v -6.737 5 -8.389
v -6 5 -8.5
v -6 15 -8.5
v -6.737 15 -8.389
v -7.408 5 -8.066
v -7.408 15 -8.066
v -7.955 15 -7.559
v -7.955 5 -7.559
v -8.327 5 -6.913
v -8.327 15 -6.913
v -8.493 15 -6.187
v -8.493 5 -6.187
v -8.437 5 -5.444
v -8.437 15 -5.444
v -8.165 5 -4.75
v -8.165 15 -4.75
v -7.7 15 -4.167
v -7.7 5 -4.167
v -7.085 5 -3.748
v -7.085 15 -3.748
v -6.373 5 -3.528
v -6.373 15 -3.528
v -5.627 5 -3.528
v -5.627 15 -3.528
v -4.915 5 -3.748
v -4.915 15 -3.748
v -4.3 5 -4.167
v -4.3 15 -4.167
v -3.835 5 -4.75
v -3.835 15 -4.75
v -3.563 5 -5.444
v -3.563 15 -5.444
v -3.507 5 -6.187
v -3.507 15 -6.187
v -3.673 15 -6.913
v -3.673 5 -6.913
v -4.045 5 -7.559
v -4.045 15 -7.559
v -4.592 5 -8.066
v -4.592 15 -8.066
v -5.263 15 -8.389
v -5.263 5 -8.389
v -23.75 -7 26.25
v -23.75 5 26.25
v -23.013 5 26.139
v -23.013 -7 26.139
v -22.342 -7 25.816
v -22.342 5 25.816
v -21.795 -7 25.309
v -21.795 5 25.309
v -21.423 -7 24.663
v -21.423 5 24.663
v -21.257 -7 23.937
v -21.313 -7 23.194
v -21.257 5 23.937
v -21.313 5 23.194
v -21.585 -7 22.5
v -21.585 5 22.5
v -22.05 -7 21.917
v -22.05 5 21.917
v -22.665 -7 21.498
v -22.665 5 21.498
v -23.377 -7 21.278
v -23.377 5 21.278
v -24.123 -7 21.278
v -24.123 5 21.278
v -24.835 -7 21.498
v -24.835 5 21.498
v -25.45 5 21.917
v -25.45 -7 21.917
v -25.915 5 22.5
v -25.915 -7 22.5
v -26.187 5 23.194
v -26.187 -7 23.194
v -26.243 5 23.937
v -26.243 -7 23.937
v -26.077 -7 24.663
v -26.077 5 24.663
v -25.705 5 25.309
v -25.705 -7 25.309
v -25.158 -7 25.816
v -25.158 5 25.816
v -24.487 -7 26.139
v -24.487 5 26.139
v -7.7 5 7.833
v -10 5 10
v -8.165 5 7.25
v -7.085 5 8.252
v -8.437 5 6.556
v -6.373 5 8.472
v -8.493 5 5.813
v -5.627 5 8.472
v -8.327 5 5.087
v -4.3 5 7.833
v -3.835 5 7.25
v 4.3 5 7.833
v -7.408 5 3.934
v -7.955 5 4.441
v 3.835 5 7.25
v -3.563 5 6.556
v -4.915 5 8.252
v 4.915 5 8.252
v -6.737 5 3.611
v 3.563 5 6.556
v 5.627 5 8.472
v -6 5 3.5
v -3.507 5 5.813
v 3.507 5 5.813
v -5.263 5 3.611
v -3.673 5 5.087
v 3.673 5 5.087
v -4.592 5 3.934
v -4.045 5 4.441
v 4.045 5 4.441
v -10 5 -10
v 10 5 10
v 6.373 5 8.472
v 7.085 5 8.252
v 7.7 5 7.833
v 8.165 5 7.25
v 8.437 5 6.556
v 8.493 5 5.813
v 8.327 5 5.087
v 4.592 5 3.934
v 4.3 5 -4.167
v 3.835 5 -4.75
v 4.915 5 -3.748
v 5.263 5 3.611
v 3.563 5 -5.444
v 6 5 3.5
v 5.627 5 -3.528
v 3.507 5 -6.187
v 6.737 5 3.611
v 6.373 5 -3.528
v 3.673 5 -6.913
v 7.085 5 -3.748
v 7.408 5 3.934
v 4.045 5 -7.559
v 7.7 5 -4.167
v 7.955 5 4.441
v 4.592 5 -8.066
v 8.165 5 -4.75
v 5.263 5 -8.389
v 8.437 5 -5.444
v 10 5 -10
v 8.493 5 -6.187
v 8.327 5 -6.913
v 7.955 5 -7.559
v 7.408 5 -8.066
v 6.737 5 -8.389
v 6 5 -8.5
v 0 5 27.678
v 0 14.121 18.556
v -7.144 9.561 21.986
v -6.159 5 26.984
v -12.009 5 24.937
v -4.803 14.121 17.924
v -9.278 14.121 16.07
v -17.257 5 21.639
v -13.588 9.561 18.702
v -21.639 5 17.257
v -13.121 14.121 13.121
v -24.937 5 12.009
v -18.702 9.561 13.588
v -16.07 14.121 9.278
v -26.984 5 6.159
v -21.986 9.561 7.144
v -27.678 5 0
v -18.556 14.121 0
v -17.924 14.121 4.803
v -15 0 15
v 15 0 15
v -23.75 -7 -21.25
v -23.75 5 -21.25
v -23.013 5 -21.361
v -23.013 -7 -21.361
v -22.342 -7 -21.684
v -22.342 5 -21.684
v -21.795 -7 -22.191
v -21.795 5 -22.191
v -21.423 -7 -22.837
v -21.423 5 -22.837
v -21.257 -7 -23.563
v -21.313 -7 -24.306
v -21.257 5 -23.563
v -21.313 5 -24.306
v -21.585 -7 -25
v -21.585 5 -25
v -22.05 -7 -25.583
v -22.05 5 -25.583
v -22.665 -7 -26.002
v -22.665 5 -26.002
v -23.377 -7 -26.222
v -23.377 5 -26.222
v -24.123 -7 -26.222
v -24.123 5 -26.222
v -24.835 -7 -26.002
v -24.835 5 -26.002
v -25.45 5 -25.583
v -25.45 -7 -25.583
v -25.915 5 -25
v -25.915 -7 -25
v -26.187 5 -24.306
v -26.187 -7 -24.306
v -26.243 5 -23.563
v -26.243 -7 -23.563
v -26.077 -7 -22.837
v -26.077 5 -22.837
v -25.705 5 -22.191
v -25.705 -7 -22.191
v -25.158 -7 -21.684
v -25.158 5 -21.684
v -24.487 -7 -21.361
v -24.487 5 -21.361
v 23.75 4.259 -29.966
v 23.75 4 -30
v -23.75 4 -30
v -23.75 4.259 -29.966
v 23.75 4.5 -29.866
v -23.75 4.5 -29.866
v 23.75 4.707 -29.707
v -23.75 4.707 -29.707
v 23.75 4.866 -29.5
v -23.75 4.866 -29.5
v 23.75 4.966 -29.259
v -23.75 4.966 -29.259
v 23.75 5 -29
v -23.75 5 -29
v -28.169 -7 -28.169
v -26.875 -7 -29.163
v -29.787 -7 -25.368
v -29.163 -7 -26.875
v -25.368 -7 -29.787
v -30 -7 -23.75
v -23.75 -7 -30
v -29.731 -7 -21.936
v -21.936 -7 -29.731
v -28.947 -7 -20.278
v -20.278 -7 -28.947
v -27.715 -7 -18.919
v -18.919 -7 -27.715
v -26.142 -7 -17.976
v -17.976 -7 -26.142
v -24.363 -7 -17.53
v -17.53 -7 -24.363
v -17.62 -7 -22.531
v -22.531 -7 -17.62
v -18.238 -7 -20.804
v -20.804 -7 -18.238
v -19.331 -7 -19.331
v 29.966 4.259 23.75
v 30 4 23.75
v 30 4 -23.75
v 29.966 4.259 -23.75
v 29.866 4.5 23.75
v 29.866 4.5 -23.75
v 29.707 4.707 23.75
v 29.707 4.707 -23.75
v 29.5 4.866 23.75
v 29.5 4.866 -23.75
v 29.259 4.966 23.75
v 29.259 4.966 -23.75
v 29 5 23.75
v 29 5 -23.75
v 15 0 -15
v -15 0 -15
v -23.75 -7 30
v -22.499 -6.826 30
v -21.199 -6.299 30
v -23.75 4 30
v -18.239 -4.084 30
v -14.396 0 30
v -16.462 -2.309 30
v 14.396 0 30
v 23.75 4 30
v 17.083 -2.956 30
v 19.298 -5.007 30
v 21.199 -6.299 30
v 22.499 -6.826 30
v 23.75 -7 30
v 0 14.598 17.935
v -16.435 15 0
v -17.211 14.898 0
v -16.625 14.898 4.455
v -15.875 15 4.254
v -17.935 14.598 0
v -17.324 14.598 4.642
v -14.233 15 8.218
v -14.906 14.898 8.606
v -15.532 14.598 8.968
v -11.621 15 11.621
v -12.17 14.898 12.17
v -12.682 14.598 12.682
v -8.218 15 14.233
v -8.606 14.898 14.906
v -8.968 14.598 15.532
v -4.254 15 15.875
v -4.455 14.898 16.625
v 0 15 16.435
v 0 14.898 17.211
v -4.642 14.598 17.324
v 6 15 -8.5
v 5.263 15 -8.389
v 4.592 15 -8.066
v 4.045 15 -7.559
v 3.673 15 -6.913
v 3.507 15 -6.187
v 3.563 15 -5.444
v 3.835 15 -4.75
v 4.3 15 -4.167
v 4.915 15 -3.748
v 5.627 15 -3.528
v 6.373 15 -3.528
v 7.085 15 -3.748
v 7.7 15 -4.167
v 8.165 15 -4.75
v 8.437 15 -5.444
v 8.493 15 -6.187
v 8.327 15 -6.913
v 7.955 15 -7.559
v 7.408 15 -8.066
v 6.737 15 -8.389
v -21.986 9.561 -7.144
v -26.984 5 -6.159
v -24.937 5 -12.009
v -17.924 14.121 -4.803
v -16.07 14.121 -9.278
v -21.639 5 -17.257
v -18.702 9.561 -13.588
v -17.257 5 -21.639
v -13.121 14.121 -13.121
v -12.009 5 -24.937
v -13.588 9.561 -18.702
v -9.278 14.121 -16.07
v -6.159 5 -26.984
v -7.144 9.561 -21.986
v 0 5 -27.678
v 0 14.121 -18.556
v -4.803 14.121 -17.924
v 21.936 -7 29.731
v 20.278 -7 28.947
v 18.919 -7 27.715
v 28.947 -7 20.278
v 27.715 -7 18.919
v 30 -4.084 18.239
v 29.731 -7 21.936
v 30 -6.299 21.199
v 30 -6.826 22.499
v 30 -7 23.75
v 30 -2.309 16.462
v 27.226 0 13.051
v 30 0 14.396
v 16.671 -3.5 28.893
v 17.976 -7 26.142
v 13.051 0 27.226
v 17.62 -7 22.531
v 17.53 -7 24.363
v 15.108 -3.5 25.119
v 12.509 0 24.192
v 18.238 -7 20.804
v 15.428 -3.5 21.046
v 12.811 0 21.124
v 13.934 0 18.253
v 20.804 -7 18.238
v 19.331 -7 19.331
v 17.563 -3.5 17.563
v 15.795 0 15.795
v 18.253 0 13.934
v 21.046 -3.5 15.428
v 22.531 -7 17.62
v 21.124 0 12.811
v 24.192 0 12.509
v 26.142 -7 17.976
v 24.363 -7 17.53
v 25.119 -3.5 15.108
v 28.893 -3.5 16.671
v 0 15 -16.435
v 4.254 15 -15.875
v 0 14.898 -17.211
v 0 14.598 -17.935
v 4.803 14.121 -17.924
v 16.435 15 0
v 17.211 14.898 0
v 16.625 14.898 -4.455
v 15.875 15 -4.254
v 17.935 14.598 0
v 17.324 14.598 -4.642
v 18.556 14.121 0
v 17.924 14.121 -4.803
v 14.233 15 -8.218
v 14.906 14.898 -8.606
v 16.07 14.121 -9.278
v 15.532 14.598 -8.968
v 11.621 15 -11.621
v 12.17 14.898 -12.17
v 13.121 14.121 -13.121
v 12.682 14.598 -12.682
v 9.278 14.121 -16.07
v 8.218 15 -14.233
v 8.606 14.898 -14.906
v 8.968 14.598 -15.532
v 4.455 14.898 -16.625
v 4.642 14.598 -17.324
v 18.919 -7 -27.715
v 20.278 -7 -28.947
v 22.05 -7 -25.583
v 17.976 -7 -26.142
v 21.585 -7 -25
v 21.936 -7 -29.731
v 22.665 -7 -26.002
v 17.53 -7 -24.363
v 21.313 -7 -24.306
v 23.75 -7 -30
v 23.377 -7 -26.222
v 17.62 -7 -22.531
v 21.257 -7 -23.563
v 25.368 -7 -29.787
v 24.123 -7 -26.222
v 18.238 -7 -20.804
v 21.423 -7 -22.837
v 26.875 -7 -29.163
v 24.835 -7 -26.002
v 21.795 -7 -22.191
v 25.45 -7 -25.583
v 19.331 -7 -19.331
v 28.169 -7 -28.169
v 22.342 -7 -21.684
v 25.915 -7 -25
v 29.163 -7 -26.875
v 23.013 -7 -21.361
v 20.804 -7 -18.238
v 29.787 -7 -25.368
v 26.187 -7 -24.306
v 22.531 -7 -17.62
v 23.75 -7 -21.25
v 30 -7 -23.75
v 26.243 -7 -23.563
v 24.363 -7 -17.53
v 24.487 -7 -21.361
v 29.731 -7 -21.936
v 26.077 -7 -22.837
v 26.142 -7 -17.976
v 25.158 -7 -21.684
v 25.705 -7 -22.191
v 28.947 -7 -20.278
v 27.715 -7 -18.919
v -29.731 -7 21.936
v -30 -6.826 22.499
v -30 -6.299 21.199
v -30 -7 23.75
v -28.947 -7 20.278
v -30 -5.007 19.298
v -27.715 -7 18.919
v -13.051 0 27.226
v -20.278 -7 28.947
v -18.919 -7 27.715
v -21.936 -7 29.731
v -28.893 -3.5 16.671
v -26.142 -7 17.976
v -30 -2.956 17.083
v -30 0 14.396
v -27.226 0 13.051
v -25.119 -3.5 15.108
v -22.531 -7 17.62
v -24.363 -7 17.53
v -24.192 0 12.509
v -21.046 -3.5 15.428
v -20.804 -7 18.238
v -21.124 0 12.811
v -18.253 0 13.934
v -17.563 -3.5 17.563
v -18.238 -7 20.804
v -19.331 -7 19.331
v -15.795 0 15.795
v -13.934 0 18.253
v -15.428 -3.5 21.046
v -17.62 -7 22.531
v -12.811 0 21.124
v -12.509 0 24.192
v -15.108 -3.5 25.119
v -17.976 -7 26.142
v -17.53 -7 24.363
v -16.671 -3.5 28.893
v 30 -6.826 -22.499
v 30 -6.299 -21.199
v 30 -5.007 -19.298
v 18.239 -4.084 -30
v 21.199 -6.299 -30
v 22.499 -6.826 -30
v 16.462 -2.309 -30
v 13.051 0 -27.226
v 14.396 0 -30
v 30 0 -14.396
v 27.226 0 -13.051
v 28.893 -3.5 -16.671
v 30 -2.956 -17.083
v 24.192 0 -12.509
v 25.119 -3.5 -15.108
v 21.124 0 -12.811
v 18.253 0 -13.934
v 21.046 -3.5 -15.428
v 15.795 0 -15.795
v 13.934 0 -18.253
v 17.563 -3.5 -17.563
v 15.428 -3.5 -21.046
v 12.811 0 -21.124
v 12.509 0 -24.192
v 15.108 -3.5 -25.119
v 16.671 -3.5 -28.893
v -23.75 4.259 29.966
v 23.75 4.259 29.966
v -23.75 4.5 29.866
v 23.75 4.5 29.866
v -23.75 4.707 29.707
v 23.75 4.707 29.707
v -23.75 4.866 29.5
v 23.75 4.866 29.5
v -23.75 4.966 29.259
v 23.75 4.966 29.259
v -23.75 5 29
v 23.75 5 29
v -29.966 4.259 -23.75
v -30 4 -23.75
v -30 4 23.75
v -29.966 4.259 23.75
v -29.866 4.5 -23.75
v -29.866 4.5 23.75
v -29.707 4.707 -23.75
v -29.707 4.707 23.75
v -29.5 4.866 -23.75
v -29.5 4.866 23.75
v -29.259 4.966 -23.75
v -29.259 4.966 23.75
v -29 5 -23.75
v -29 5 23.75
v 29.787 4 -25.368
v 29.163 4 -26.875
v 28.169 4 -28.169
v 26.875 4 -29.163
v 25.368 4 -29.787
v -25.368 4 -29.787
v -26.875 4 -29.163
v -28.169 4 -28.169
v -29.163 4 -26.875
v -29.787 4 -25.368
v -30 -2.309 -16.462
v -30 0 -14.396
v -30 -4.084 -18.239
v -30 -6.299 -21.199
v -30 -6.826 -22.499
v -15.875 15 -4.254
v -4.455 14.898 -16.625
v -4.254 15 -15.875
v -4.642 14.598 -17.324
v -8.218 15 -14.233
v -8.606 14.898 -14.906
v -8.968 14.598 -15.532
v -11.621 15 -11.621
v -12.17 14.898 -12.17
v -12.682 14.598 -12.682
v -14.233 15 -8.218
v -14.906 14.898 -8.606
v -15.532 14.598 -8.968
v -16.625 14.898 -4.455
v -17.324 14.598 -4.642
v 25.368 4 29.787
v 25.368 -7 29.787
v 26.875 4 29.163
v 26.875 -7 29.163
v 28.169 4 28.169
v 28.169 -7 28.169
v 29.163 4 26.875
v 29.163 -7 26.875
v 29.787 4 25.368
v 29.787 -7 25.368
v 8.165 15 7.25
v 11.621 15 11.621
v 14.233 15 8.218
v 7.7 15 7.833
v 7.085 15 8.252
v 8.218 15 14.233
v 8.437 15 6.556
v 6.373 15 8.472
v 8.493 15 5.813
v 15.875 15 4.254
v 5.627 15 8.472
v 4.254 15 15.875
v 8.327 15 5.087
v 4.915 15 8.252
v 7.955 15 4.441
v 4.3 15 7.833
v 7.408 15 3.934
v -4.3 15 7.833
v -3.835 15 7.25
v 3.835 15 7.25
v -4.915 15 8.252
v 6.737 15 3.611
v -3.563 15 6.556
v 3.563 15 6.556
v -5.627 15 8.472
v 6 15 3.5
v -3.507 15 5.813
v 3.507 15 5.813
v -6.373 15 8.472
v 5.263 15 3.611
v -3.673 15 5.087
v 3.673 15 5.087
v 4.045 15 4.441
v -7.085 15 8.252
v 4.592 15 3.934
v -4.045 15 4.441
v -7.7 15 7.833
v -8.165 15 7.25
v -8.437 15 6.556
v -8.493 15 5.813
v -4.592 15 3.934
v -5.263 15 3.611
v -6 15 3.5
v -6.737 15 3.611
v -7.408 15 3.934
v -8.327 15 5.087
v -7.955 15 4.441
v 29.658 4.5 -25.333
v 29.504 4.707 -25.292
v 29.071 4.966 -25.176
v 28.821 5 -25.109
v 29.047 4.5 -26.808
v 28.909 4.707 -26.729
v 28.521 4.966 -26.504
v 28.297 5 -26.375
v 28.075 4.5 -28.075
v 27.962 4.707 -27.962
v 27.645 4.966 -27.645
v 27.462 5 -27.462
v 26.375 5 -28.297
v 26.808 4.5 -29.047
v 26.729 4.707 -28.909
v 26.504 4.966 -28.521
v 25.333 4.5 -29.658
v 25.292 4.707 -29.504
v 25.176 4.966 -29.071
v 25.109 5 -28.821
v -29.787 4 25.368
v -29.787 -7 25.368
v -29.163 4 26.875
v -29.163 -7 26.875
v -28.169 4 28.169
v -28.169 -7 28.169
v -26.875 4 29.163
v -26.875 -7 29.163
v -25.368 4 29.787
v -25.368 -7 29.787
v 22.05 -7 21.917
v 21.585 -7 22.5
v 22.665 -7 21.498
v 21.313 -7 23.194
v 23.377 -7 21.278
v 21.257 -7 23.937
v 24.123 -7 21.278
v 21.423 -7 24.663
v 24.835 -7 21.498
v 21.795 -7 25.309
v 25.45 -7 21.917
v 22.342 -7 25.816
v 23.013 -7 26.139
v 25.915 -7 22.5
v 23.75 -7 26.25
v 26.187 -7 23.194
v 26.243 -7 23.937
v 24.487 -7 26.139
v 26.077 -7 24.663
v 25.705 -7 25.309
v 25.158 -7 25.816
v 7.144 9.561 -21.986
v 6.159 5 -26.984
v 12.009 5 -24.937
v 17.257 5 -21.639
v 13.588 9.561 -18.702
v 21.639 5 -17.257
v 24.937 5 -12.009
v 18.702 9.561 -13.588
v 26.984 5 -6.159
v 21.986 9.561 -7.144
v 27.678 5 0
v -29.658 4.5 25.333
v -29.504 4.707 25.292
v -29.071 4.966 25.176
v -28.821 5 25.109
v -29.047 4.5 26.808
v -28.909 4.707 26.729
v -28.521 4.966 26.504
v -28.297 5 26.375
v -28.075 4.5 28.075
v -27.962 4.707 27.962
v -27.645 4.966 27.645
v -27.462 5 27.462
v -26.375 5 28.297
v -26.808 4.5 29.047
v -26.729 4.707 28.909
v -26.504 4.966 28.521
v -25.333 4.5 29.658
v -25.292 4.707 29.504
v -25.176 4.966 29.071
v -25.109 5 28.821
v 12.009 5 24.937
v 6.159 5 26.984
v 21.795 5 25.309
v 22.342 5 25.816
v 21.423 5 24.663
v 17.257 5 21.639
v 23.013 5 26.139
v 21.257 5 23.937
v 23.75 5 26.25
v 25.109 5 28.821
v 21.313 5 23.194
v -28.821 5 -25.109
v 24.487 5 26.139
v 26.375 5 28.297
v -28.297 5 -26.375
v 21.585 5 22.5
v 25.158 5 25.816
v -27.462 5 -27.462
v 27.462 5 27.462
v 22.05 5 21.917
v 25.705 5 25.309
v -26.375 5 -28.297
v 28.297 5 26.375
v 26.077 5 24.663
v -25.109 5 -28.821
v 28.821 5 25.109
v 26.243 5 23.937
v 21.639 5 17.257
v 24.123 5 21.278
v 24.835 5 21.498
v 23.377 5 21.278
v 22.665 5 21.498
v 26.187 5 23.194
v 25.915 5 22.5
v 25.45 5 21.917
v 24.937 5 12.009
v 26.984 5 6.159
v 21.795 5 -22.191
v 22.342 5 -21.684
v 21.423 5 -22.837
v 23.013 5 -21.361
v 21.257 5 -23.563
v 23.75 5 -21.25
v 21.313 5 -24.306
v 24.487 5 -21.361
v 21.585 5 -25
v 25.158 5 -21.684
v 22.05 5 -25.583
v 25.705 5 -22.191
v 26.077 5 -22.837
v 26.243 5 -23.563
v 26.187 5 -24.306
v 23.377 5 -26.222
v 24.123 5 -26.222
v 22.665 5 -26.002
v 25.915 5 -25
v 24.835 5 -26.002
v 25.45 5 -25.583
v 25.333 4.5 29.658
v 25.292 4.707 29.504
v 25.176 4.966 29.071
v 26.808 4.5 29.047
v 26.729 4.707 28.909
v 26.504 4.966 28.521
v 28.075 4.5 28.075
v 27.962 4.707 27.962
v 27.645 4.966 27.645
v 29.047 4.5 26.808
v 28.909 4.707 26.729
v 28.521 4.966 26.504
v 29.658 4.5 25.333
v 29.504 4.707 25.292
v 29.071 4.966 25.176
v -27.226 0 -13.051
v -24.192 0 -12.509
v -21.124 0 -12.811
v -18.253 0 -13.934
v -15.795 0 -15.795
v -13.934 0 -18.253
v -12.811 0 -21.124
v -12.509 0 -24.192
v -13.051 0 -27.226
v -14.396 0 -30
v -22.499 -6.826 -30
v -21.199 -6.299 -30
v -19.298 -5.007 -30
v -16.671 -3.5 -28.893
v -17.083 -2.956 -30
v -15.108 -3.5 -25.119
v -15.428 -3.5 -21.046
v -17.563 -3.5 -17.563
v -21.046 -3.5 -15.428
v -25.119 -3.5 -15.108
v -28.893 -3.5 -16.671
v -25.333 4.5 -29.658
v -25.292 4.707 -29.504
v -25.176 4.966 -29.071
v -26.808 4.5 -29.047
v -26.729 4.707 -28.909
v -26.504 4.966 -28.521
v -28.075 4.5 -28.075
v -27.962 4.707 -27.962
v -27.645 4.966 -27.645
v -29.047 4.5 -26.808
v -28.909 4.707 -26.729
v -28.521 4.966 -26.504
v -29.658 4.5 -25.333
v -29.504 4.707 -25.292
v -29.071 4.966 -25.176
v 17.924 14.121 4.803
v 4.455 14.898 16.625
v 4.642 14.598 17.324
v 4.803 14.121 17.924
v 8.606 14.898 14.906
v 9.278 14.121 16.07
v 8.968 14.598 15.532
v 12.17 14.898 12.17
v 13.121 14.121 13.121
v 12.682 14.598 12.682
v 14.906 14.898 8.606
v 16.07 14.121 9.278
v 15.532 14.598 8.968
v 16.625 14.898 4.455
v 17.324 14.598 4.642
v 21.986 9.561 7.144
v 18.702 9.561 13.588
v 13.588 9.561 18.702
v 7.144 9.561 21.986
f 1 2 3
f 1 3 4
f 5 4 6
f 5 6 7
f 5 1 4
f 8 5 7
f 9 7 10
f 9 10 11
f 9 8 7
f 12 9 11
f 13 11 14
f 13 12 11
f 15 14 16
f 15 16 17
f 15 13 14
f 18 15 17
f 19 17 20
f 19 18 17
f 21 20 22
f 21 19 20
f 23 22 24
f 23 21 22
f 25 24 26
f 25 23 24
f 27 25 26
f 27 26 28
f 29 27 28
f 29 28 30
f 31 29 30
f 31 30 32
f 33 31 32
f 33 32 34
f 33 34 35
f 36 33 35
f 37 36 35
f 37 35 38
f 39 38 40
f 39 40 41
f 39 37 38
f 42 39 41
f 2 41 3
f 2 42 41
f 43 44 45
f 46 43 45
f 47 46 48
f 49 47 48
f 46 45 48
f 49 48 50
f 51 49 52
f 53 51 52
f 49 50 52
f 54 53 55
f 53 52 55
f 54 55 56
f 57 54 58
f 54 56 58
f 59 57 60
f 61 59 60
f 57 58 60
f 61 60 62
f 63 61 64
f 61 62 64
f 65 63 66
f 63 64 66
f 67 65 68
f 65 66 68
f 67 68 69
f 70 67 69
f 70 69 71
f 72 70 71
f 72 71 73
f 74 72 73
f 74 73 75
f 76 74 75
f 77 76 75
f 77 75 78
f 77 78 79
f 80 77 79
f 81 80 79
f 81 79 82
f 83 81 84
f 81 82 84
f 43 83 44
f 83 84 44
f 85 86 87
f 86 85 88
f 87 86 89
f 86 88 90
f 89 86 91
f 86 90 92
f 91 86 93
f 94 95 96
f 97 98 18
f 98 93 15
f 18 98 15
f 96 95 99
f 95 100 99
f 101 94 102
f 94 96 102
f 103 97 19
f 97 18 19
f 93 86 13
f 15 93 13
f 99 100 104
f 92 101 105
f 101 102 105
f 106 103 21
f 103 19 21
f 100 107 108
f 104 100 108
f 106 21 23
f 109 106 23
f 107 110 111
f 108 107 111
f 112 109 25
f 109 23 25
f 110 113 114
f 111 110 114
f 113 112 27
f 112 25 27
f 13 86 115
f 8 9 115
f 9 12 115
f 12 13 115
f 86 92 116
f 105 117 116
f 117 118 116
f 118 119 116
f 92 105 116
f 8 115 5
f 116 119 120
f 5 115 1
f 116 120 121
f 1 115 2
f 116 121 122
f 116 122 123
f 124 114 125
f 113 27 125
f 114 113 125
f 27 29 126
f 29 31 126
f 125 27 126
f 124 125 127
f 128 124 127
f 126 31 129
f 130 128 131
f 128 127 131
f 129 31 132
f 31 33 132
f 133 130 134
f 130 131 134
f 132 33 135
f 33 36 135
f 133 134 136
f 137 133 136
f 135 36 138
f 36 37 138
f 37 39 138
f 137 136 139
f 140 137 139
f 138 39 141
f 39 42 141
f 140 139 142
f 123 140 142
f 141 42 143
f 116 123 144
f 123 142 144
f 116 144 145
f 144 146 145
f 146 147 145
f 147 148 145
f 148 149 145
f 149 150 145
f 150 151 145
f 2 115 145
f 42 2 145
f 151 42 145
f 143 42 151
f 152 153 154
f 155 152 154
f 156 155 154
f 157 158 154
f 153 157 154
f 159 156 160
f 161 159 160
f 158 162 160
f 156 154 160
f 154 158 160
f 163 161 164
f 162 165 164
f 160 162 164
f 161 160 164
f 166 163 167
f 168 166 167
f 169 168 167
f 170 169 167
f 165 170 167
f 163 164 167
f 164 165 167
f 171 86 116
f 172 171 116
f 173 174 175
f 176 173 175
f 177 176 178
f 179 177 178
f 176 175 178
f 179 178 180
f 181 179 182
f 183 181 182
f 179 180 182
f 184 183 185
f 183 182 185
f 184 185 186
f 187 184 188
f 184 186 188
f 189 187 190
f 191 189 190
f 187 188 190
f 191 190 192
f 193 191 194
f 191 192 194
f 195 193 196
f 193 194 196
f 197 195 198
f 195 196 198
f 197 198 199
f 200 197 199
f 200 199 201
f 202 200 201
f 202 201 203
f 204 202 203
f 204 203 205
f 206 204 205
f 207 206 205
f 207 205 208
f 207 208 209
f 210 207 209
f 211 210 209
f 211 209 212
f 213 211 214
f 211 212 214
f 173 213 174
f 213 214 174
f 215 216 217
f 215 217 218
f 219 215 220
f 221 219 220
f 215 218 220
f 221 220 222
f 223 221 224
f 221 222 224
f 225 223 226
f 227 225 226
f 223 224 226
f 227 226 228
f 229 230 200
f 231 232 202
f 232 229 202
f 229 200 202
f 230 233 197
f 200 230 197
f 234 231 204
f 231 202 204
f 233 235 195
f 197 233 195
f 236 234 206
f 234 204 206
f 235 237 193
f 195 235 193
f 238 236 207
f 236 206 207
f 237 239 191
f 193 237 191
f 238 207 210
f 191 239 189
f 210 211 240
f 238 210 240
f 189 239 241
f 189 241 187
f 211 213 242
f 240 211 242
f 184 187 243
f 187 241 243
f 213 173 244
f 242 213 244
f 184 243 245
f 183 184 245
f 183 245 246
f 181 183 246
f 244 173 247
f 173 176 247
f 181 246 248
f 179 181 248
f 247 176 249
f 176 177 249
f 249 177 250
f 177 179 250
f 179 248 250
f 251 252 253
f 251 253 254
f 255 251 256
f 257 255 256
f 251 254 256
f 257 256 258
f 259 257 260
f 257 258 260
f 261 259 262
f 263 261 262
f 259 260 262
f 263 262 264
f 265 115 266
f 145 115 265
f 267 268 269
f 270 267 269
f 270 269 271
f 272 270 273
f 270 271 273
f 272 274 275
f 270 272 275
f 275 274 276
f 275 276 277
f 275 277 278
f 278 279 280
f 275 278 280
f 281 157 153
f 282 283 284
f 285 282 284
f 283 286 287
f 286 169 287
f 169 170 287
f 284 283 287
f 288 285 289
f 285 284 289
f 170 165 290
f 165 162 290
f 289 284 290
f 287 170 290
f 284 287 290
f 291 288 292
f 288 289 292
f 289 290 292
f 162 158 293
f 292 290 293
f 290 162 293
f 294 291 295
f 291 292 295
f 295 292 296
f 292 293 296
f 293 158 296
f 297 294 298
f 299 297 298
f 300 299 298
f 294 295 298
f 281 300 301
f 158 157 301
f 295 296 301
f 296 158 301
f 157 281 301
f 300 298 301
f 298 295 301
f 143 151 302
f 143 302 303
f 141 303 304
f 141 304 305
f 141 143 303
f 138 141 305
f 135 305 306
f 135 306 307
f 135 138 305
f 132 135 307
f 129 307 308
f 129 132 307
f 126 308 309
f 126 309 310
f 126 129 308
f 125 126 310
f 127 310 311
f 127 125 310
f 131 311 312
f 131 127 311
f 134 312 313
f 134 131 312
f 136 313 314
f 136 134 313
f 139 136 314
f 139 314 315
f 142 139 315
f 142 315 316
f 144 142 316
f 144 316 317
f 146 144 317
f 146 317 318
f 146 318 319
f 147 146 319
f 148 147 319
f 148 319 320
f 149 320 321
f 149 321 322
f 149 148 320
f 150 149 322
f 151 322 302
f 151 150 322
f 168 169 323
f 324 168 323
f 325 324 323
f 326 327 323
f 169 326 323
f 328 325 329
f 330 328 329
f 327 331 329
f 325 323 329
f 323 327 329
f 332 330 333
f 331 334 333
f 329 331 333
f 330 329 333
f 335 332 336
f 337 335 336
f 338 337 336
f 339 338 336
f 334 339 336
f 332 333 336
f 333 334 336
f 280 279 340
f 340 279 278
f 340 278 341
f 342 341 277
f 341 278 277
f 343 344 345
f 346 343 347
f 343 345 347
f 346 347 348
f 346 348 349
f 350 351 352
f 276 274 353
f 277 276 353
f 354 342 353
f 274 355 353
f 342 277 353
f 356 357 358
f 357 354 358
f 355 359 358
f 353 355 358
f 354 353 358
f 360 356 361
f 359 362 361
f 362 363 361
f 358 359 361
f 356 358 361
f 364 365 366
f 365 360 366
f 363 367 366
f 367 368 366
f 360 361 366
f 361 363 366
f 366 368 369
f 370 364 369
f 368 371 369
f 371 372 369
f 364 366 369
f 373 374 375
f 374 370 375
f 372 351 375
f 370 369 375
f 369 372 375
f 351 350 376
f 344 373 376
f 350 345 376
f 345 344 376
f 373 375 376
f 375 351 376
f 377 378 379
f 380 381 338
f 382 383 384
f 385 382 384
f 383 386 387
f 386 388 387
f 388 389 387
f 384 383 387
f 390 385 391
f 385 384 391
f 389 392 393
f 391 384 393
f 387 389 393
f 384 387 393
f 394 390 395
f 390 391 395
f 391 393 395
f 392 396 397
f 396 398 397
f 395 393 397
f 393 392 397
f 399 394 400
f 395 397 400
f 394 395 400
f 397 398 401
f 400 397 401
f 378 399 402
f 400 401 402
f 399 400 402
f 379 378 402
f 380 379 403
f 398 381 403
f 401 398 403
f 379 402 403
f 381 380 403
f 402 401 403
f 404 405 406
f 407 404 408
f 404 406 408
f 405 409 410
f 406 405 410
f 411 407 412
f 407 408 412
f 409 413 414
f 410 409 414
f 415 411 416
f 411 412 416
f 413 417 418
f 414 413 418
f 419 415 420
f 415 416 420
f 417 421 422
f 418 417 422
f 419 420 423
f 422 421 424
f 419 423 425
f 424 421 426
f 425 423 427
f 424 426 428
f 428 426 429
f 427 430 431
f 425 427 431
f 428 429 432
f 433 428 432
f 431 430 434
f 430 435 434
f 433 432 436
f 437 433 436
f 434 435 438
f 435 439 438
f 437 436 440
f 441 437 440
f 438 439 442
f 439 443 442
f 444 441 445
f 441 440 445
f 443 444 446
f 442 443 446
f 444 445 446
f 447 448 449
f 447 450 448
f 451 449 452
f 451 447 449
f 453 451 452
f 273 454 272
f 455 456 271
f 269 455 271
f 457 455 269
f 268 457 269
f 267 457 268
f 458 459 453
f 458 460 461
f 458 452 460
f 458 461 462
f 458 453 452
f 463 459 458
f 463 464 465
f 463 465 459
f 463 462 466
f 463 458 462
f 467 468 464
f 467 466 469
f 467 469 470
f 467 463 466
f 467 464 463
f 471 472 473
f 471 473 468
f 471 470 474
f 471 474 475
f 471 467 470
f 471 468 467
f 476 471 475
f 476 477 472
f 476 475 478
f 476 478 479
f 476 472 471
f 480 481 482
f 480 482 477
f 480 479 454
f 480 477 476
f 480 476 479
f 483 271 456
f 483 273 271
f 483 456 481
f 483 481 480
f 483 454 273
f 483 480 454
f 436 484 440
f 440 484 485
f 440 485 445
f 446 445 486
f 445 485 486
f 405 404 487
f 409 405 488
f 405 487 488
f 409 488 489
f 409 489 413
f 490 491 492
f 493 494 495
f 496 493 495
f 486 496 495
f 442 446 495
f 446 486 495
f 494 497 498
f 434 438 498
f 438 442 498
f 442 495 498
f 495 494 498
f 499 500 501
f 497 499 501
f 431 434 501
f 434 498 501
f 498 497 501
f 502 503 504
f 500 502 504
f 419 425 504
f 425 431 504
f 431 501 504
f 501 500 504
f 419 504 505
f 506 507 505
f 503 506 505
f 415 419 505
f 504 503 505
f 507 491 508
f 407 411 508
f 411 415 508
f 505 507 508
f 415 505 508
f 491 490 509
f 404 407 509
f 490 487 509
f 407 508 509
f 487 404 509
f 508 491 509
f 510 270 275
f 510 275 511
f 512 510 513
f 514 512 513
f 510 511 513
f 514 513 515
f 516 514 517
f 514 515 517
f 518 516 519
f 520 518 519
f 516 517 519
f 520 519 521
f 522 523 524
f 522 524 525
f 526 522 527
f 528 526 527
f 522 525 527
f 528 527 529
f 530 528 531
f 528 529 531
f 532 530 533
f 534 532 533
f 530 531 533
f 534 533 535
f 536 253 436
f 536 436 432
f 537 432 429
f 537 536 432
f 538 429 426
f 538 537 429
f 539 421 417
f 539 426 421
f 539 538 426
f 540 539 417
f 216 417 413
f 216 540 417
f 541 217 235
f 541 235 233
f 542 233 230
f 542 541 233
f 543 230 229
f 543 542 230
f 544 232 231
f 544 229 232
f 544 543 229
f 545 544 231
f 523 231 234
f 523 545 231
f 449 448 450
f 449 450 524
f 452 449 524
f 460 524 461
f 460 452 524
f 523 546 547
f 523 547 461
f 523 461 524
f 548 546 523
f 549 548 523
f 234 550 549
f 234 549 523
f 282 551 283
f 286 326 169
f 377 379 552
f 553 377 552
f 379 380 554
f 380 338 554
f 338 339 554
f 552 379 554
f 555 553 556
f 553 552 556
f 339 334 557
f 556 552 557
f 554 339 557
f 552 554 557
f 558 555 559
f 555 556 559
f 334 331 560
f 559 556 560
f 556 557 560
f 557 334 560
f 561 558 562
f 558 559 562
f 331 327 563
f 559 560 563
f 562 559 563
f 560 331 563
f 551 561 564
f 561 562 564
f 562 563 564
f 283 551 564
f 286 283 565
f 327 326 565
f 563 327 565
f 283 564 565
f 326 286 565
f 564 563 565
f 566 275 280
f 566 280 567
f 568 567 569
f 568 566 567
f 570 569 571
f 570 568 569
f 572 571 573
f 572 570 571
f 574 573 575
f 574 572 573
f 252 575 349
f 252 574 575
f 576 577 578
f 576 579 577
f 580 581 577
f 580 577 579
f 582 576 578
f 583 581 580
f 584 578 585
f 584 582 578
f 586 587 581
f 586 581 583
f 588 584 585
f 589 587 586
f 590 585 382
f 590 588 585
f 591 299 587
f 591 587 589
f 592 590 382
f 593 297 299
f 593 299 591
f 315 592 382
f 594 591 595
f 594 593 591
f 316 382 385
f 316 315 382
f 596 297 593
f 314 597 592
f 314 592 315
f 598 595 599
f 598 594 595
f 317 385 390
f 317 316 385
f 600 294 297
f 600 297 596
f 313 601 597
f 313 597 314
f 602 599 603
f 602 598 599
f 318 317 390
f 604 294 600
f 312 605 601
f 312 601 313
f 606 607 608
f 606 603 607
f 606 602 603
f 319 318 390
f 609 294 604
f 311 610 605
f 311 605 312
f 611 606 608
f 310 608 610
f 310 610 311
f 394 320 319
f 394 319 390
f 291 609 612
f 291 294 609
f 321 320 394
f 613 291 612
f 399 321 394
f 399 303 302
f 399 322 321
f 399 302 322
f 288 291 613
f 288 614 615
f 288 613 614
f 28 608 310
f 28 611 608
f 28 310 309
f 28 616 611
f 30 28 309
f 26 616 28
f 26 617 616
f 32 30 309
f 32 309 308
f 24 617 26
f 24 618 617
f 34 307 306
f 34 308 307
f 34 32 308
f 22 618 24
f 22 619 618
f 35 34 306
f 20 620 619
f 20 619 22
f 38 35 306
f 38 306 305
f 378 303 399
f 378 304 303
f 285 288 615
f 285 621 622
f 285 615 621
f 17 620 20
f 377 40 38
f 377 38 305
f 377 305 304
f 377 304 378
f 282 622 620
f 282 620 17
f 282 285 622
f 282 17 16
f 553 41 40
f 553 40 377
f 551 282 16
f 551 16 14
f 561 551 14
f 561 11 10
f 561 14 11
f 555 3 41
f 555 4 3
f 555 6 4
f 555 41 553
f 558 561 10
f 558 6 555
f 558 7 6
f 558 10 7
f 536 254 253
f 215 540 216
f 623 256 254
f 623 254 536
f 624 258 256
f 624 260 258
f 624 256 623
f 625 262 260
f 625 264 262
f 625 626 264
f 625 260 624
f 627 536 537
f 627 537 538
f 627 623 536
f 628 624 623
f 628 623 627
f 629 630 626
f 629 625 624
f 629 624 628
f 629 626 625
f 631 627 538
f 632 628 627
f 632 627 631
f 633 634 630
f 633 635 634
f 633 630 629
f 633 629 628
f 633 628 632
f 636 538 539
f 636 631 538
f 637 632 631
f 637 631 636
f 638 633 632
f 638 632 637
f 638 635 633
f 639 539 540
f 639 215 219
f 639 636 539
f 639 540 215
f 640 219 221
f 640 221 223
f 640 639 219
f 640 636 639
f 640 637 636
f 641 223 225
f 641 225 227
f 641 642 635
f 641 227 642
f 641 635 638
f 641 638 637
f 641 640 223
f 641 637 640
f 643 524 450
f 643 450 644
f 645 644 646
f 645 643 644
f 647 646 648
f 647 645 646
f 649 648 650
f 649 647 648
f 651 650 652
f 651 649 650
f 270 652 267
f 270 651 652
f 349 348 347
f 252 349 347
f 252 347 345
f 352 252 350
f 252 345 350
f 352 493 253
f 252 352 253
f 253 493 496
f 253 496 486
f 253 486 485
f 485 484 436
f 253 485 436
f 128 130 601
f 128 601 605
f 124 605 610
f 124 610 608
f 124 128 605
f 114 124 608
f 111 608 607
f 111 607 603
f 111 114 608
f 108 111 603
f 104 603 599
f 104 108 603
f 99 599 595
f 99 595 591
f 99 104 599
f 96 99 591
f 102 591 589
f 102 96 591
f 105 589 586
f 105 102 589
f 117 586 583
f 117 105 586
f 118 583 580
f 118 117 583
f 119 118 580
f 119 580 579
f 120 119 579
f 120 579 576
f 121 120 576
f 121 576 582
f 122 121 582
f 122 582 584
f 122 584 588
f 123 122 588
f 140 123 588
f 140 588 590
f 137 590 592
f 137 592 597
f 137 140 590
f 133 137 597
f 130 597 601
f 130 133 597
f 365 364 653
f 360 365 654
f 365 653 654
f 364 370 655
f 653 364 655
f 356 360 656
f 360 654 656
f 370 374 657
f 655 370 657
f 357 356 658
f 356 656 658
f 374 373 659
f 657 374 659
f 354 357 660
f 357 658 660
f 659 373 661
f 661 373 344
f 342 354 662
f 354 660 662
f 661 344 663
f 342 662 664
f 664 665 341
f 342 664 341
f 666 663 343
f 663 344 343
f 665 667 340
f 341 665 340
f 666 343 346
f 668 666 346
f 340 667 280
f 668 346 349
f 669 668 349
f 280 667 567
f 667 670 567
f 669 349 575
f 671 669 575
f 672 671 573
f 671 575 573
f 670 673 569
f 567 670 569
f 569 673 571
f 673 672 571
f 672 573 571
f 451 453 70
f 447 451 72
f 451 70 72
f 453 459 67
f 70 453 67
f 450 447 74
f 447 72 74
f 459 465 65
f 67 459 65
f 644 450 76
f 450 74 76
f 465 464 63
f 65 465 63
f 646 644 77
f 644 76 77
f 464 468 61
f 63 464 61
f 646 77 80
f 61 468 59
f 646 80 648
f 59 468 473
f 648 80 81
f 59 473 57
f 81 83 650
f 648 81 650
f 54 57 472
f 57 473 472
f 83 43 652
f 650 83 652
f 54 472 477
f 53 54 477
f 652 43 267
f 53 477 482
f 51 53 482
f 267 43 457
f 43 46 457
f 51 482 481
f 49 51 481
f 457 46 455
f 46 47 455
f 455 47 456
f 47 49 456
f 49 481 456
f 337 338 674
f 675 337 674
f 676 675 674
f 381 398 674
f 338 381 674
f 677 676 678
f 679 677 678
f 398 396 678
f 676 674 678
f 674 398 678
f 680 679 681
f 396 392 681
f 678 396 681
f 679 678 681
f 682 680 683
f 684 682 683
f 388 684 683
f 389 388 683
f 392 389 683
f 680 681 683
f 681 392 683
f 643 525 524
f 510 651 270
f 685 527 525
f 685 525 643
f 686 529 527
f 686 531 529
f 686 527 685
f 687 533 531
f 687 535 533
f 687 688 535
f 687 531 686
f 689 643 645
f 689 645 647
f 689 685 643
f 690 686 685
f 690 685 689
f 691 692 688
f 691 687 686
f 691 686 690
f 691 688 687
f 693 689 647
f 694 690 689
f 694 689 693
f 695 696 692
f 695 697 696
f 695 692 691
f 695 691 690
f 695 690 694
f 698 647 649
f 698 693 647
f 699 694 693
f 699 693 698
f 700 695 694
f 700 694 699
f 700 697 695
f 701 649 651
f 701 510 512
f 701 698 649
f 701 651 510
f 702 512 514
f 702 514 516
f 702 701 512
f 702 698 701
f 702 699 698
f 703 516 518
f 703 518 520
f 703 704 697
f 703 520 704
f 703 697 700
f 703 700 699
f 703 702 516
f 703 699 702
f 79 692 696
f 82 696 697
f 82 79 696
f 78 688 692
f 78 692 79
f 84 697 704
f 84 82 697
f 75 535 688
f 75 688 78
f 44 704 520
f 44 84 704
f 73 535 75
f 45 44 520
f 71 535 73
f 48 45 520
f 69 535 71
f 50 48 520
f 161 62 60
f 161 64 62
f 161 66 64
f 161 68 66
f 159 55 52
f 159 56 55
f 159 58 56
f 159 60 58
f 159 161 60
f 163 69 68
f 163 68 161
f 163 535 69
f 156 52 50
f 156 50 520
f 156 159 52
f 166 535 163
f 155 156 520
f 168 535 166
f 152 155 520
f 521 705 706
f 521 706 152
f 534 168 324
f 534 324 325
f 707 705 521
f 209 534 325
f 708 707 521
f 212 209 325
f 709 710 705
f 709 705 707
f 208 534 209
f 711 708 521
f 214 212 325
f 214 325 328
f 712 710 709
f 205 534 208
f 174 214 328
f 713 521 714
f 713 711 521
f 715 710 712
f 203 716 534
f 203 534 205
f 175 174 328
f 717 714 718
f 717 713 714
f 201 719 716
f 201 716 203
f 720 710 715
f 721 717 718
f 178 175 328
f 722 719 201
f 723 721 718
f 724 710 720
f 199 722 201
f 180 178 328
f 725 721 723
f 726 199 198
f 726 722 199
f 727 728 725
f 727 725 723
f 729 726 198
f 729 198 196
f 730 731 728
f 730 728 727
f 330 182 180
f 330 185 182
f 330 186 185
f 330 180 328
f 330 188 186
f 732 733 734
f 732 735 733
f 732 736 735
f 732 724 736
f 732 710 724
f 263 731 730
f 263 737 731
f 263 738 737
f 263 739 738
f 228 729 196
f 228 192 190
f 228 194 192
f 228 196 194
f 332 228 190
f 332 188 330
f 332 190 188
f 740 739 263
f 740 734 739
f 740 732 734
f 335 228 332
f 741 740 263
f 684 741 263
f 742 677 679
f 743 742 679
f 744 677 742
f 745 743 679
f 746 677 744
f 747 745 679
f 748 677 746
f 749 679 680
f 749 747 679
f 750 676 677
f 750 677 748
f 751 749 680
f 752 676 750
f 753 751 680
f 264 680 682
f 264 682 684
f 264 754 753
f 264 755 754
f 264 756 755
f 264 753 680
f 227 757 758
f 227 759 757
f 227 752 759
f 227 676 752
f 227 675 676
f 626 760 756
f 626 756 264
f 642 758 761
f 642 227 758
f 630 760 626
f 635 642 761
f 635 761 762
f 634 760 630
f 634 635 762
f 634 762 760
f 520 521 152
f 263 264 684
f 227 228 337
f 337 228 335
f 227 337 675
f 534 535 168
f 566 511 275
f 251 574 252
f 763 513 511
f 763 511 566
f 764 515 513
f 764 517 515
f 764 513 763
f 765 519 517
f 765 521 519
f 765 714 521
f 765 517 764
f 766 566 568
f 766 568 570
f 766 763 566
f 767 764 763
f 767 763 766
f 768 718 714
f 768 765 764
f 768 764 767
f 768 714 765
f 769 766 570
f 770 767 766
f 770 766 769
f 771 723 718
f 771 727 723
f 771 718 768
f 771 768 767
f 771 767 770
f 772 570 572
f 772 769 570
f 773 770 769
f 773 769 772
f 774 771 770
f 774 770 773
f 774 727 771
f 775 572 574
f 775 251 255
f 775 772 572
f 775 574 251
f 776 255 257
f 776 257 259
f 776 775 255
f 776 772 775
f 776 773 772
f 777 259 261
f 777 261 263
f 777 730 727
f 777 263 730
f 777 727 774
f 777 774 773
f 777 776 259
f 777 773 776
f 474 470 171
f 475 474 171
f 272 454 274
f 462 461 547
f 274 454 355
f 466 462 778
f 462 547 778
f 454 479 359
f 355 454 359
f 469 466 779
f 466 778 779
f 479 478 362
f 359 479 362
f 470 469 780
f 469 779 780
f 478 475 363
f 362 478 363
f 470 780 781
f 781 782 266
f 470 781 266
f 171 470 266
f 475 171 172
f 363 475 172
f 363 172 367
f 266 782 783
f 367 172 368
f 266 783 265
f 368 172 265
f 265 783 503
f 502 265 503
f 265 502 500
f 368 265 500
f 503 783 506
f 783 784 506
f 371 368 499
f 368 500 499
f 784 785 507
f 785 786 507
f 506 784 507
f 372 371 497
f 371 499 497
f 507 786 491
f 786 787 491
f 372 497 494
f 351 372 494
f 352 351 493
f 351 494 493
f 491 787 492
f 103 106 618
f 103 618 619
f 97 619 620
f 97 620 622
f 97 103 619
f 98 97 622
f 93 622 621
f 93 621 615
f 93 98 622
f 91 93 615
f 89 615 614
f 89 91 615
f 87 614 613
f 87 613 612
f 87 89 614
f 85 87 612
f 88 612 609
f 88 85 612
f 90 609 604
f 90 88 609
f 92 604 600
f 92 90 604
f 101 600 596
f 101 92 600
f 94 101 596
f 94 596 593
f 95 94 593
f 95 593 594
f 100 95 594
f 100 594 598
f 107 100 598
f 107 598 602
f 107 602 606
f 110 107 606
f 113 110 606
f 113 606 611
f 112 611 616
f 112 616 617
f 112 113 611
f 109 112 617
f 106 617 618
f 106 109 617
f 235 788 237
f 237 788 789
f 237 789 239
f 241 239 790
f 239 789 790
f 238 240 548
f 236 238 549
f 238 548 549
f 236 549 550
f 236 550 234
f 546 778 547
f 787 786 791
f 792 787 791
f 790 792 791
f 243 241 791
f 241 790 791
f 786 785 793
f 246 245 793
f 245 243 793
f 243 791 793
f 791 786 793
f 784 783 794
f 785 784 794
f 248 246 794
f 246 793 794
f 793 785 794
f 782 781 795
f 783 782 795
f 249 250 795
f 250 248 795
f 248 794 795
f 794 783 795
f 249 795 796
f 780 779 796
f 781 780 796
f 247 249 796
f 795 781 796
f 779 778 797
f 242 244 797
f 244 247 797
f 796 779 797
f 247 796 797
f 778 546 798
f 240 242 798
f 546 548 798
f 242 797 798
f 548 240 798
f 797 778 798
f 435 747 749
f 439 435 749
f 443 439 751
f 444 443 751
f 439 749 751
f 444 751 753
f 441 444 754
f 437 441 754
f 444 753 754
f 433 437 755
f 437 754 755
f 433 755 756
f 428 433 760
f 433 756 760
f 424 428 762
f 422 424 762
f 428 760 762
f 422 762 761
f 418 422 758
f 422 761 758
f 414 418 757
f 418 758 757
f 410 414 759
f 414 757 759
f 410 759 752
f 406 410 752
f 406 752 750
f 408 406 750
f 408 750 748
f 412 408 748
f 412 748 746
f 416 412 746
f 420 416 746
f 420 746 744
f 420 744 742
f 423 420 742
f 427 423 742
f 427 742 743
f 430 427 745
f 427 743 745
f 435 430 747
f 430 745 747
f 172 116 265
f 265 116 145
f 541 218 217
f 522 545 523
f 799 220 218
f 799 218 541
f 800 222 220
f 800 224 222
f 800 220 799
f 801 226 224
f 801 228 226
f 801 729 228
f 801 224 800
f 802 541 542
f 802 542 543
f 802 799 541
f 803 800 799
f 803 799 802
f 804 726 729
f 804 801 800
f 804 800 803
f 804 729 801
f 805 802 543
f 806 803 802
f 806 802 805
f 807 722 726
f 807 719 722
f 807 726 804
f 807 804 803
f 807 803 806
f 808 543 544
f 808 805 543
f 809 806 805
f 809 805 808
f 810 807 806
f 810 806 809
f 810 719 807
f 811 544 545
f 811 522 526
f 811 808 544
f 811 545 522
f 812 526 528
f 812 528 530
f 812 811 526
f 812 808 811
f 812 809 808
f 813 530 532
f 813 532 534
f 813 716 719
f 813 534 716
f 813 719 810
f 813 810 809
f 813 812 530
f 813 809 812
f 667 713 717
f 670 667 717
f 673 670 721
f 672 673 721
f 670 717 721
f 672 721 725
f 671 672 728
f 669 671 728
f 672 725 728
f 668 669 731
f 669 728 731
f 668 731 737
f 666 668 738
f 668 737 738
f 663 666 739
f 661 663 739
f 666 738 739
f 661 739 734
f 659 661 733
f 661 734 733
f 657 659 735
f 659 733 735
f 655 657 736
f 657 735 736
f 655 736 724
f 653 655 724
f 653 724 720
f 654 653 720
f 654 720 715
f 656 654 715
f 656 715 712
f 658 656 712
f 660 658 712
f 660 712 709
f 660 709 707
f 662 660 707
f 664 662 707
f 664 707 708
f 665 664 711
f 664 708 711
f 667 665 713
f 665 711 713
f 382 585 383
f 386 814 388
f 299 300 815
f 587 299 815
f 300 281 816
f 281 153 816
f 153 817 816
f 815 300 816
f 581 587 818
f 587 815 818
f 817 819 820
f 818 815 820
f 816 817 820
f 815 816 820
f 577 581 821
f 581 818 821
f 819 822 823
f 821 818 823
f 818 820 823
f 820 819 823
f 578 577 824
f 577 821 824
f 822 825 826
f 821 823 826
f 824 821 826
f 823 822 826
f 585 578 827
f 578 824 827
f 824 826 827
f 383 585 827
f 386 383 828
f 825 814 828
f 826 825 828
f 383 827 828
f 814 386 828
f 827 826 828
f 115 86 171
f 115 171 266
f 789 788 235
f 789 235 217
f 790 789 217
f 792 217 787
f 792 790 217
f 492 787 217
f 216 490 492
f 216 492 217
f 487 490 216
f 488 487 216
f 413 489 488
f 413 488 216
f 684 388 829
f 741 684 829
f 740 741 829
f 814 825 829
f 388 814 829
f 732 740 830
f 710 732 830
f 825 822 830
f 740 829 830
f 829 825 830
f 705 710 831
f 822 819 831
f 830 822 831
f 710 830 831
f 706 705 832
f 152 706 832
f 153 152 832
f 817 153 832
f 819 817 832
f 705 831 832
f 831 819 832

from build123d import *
from build123d.topology import SkipClean

# Parameters (mm, degrees)
SKETCH_1_W          = 60
SKETCH_1_H          = 60
EXTRUDE_1_DEPTH     = 5
EXTRUDE_START       = 5
SKETCH_2_R          = 17.67766953
EXTRUDE_3_DEPTH     = 10
SKETCH_6_W          = 30
SKETCH_6_H          = 30
CUT_EXTRUDE_2_DEPTH = 5
CHAMFER_1_SIZE      = 5
SKETCH_7_R          = 6.25
EXTRUDE_4_DEPTH     = 7
CUT_EXTRUDE_START   = 5
CUT_EXTRUDE_3_DEPTH = 5
CUT_EXTRUDE_4_DEPTH = 7
SKETCH_18_R         = 2.5
CUT_EXTRUDE_5_DEPTH = 12
SKETCH_21_R         = 2.5
CUT_EXTRUDE_6_DEPTH = 10
FILLET_1_R          = 1
FILLET_2_R          = 3


with BuildPart() as part:
    # 草图1 → 凸台-拉伸1 (new body)
    with BuildSketch(Plane(origin=(0, 0, 0), x_dir=(1, 0, 0), z_dir=(0, 1, 0))):
        Rectangle(SKETCH_1_W, SKETCH_1_H)
    extrude(amount=EXTRUDE_1_DEPTH)

    # 草图2 → 凸台-拉伸3 (add)
    with BuildSketch(Plane(origin=(0, 0, 0), x_dir=(1, 0, 0), z_dir=(0, 1, 0)).offset(EXTRUDE_START)):
        with Locations(Location((0, 0, 0), (0, 0, 90))):
            Circle(SKETCH_2_R)
    extrude(amount=EXTRUDE_3_DEPTH)

    # 扫描1: sweep along a curve in space
    with BuildLine() as sweep_1_path:
        ThreePointArc((0, 5, -17.67766953), (12.5, 5, -12.5), (17.67766953, 5, 0))
        ThreePointArc((17.67766953, 5, 0), (12.5, 5, 12.5), (0, 5, 17.67766953))
        ThreePointArc((0, 5, 17.67766953), (-12.5, 5, 12.5), (-17.67766953, 5, 0))
        ThreePointArc((-17.67766953, 5, 0), (-12.5, 5, -12.5), (0, 5, -17.67766953))
    # 草图4 → 扫描1 (sweep)
    with BuildSketch(Plane.XY):
        Polygon((17.67766953, 15), (17.67766953, 5), (27.67766953, 5), align=None)
    sweep(path=sweep_1_path.line)

    # 草图6 → 切除-拉伸2 (cut)
    with BuildSketch(Plane(origin=(0, 0, 0), x_dir=(1, 0, 0), z_dir=(0, 1, 0))):
        Rectangle(SKETCH_6_W, SKETCH_6_H)
    extrude(amount=CUT_EXTRUDE_2_DEPTH, mode=Mode.SUBTRACT)

    # 倒角1
    chamfer_1_edges = [part.edges().sort_by_distance(p)[0] for p in [
        (0, 5, -15),
        (-15, 5, 0),
        (0, 5, 15),
        (15, 5, 0),
    ]]
    chamfer(chamfer_1_edges, length=CHAMFER_1_SIZE - 0.0001)  # a hair under: the kernel refuses the full size

    # 草图7 → 凸台-拉伸4 (add)
    with BuildSketch(Plane(origin=(0, 0, 0), x_dir=(1, 0, 0), z_dir=(0, 1, 0))):
        with Locations(Location((-23.75, 23.75, 0), (0, 0, 270))):
            Circle(SKETCH_7_R)
        with Locations(Location((23.75, 23.75, 0), (0, 0, 270))):
            Circle(SKETCH_7_R)
        with Locations(Location((-23.75, -23.75, 0), (0, 0, 270))):
            Circle(SKETCH_7_R)
        with Locations(Location((23.75, -23.75, 0), (0, 0, 270))):
            Circle(SKETCH_7_R)
    extrude(amount=-EXTRUDE_4_DEPTH)

    # 草图8 → 切除-拉伸3 (cut)
    with BuildSketch(Plane(origin=(0, 0, 0), x_dir=(1, 0, 0), z_dir=(0, 1, 0)).offset(CUT_EXTRUDE_START)):
        with BuildLine():
            Line((23.75, 30), (30, 30))
            Line((30, 30), (30, 23.75))
            ThreePointArc((30, 23.75), (28.169417382, 28.169417382), (23.75, 30))
        make_face()
        with BuildLine():
            Line((-30, 30), (-23.75, 30))
            ThreePointArc((-23.75, 30), (-28.169417382, 28.169417382), (-30, 23.75))
            Line((-30, 23.75), (-30, 30))
        make_face()
        with BuildLine():
            Line((-23.75, -30), (-30, -30))
            Line((-30, -30), (-30, -23.75))
            ThreePointArc((-30, -23.75), (-28.169417382, -28.169417382), (-23.75, -30))
        make_face()
        with BuildLine():
            Line((30, -23.75), (30, -30))
            Line((30, -30), (23.75, -30))
            ThreePointArc((23.75, -30), (28.169417382, -28.169417382), (30, -23.75))
        make_face()
    extrude(amount=-CUT_EXTRUDE_3_DEPTH, mode=Mode.SUBTRACT)

    # 草图9 → 旋转1 (revolve)
    with BuildSketch(Plane(origin=(0, 0, 23.75), x_dir=(-1, 0, 0), z_dir=(0, 0, -1)), mode=Mode.PRIVATE) as revolve_1_sk:
        Polygon((17.5, -7), (17.5, 0), (12.5, 0), align=None)
    revolve(revolve_1_sk.sketch.rotate(Axis((-23.75, 5, 23.75), (0, -1, 0)), 90), axis=Axis((-23.75, 5, 23.75), (0, -1, 0)))

    # 草图13 → 旋转2 (revolve)
    with BuildSketch(Plane(origin=(0, 0, 23.75), x_dir=(-1, 0, 0), z_dir=(0, 0, -1)), mode=Mode.PRIVATE) as revolve_2_sk:
        Polygon((-17.5, 0), (-17.5, -7), (-12.5, 0), align=None)
    revolve(revolve_2_sk.sketch.rotate(Axis((23.75, 5, 23.75), (0, -1, 0)), 270), axis=Axis((23.75, 5, 23.75), (0, -1, 0)))

    # 草图14 → 旋转3 (revolve)
    with BuildSketch(Plane(origin=(0, 0, -23.75), x_dir=(-1, 0, 0), z_dir=(0, 0, -1)), mode=Mode.PRIVATE) as revolve_3_sk:
        Polygon((-17.5, -7), (-12.5, 0), (-17.5, 0), align=None)
    revolve(revolve_3_sk.sketch.rotate(Axis((23.75, 5, -23.75), (0, -1, 0)), 270), axis=Axis((23.75, 5, -23.75), (0, -1, 0)))

    # 草图16 → 旋转4 (revolve)
    with BuildSketch(Plane(origin=(0, 0, -23.75), x_dir=(-1, 0, 0), z_dir=(0, 0, -1)), mode=Mode.PRIVATE) as revolve_4_sk:
        Polygon((17.5, 0), (17.5, -7), (12.5, 0), align=None)
    revolve(revolve_4_sk.sketch.rotate(Axis((-23.75, 5, -23.75), (0, -1, 0)), 90), axis=Axis((-23.75, 5, -23.75), (0, -1, 0)))

    # 草图17 → 切除-拉伸4 (cut)
    with SkipClean():  # the faces are left unmerged after this step: merging them gives an invalid solid
        with BuildSketch(Plane(origin=(0, 0, 0), x_dir=(1, 0, 0), z_dir=(0, 1, 0))):
            with BuildLine():
                Line((-30, -23.75), (-30, -14.395856533))
                ThreePointArc((-30, -14.395856533), (-31.704951288, -31.704951288), (-14.395856533, -30))
                Line((-14.395856533, -30), (-23.75, -30))
                ThreePointArc((-23.75, -30), (-28.169417382, -28.169417382), (-30, -23.75))
            make_face()
            with BuildLine():
                Line((30, -14.395856533), (30, -23.75))
                ThreePointArc((30, -23.75), (28.169417382, -28.169417382), (23.75, -30))
                Line((23.75, -30), (14.395856533, -30))
                ThreePointArc((14.395856533, -30), (31.704951288, -31.704951288), (30, -14.395856533))
            make_face()
            with BuildLine():
                Line((30, 23.75), (30, 14.395856533))
                ThreePointArc((30, 14.395856533), (31.704951288, 31.704951288), (14.395856533, 30))
                Line((14.395856533, 30), (23.75, 30))
                ThreePointArc((23.75, 30), (28.169417382, 28.169417382), (30, 23.75))
            make_face()
            with BuildLine():
                Line((-23.75, 30), (-14.395856533, 30))
                ThreePointArc((-14.395856533, 30), (-31.704951288, 31.704951288), (-30, 14.395856533))
                Line((-30, 14.395856533), (-30, 23.75))
                ThreePointArc((-30, 23.75), (-28.169417382, 28.169417382), (-23.75, 30))
            make_face()
        extrude(amount=-CUT_EXTRUDE_4_DEPTH, mode=Mode.SUBTRACT)

    # 草图18 → 切除-拉伸5 (cut)
    with SkipClean():  # the faces are left unmerged after this step: merging them gives an invalid solid
        with BuildSketch(Plane(origin=(0, 0, 0), x_dir=(1, 0, 0), z_dir=(0, 1, 0)).offset(CUT_EXTRUDE_START)):
            with Locations(Location((-23.75, 23.75, 0), (0, 0, 270))):
                Circle(SKETCH_18_R)
            with Locations(Location((23.75, 23.75, 0), (0, 0, 270))):
                Circle(SKETCH_18_R)
            with Locations(Location((-23.75, -23.75, 0), (0, 0, 270))):
                Circle(SKETCH_18_R)
            with Locations(Location((23.75, -23.75, 0), (0, 0, 270))):
                Circle(SKETCH_18_R)
        extrude(amount=-CUT_EXTRUDE_5_DEPTH, mode=Mode.SUBTRACT)

    # 草图21 → 切除-拉伸6 (cut)
    with SkipClean():  # the faces are left unmerged after this step: merging them gives an invalid solid
        with BuildSketch(Plane(origin=(0, 0, 0), x_dir=(1, 0, 0), z_dir=(0, 1, 0)).offset(CUT_EXTRUDE_START)):
            with Locations(Location((-6, 6, 0), (0, 0, 90))):
                Circle(SKETCH_21_R)
            with Locations(Location((6, 6, 0), (0, 0, 90))):
                Circle(SKETCH_21_R)
            with Locations(Location((6, -6, 0), (0, 0, 90))):
                Circle(SKETCH_21_R)
            with Locations(Location((-6, -6, 0), (0, 0, 90))):
                Circle(SKETCH_21_R)
        extrude(amount=CUT_EXTRUDE_6_DEPTH, mode=Mode.SUBTRACT)

    # 圆角1
    fillet_1_edges = [part.edges().sort_by_distance(p)[0] for p in [
        (0, 5, 30),
        (-30, 5, 0),
        (0, 5, -30),
        (30, 5, 0),
        (28.169417382, 5, 28.169417382),
        (-28.169417382, 5, 28.169417382),
        (-28.169417382, 5, -28.169417382),
        (28.169417382, 5, -28.169417382),
    ]]
    fillet(fillet_1_edges, radius=FILLET_1_R)

    # 圆角2
    fillet_2_edges = [part.edges().sort_by_distance(p)[0] for p in [
        (0, 15, -17.67766953),
        (-12.5, 15, 12.5),
    ]]
    fillet(fillet_2_edges, radius=FILLET_2_R)


solid = part.part
